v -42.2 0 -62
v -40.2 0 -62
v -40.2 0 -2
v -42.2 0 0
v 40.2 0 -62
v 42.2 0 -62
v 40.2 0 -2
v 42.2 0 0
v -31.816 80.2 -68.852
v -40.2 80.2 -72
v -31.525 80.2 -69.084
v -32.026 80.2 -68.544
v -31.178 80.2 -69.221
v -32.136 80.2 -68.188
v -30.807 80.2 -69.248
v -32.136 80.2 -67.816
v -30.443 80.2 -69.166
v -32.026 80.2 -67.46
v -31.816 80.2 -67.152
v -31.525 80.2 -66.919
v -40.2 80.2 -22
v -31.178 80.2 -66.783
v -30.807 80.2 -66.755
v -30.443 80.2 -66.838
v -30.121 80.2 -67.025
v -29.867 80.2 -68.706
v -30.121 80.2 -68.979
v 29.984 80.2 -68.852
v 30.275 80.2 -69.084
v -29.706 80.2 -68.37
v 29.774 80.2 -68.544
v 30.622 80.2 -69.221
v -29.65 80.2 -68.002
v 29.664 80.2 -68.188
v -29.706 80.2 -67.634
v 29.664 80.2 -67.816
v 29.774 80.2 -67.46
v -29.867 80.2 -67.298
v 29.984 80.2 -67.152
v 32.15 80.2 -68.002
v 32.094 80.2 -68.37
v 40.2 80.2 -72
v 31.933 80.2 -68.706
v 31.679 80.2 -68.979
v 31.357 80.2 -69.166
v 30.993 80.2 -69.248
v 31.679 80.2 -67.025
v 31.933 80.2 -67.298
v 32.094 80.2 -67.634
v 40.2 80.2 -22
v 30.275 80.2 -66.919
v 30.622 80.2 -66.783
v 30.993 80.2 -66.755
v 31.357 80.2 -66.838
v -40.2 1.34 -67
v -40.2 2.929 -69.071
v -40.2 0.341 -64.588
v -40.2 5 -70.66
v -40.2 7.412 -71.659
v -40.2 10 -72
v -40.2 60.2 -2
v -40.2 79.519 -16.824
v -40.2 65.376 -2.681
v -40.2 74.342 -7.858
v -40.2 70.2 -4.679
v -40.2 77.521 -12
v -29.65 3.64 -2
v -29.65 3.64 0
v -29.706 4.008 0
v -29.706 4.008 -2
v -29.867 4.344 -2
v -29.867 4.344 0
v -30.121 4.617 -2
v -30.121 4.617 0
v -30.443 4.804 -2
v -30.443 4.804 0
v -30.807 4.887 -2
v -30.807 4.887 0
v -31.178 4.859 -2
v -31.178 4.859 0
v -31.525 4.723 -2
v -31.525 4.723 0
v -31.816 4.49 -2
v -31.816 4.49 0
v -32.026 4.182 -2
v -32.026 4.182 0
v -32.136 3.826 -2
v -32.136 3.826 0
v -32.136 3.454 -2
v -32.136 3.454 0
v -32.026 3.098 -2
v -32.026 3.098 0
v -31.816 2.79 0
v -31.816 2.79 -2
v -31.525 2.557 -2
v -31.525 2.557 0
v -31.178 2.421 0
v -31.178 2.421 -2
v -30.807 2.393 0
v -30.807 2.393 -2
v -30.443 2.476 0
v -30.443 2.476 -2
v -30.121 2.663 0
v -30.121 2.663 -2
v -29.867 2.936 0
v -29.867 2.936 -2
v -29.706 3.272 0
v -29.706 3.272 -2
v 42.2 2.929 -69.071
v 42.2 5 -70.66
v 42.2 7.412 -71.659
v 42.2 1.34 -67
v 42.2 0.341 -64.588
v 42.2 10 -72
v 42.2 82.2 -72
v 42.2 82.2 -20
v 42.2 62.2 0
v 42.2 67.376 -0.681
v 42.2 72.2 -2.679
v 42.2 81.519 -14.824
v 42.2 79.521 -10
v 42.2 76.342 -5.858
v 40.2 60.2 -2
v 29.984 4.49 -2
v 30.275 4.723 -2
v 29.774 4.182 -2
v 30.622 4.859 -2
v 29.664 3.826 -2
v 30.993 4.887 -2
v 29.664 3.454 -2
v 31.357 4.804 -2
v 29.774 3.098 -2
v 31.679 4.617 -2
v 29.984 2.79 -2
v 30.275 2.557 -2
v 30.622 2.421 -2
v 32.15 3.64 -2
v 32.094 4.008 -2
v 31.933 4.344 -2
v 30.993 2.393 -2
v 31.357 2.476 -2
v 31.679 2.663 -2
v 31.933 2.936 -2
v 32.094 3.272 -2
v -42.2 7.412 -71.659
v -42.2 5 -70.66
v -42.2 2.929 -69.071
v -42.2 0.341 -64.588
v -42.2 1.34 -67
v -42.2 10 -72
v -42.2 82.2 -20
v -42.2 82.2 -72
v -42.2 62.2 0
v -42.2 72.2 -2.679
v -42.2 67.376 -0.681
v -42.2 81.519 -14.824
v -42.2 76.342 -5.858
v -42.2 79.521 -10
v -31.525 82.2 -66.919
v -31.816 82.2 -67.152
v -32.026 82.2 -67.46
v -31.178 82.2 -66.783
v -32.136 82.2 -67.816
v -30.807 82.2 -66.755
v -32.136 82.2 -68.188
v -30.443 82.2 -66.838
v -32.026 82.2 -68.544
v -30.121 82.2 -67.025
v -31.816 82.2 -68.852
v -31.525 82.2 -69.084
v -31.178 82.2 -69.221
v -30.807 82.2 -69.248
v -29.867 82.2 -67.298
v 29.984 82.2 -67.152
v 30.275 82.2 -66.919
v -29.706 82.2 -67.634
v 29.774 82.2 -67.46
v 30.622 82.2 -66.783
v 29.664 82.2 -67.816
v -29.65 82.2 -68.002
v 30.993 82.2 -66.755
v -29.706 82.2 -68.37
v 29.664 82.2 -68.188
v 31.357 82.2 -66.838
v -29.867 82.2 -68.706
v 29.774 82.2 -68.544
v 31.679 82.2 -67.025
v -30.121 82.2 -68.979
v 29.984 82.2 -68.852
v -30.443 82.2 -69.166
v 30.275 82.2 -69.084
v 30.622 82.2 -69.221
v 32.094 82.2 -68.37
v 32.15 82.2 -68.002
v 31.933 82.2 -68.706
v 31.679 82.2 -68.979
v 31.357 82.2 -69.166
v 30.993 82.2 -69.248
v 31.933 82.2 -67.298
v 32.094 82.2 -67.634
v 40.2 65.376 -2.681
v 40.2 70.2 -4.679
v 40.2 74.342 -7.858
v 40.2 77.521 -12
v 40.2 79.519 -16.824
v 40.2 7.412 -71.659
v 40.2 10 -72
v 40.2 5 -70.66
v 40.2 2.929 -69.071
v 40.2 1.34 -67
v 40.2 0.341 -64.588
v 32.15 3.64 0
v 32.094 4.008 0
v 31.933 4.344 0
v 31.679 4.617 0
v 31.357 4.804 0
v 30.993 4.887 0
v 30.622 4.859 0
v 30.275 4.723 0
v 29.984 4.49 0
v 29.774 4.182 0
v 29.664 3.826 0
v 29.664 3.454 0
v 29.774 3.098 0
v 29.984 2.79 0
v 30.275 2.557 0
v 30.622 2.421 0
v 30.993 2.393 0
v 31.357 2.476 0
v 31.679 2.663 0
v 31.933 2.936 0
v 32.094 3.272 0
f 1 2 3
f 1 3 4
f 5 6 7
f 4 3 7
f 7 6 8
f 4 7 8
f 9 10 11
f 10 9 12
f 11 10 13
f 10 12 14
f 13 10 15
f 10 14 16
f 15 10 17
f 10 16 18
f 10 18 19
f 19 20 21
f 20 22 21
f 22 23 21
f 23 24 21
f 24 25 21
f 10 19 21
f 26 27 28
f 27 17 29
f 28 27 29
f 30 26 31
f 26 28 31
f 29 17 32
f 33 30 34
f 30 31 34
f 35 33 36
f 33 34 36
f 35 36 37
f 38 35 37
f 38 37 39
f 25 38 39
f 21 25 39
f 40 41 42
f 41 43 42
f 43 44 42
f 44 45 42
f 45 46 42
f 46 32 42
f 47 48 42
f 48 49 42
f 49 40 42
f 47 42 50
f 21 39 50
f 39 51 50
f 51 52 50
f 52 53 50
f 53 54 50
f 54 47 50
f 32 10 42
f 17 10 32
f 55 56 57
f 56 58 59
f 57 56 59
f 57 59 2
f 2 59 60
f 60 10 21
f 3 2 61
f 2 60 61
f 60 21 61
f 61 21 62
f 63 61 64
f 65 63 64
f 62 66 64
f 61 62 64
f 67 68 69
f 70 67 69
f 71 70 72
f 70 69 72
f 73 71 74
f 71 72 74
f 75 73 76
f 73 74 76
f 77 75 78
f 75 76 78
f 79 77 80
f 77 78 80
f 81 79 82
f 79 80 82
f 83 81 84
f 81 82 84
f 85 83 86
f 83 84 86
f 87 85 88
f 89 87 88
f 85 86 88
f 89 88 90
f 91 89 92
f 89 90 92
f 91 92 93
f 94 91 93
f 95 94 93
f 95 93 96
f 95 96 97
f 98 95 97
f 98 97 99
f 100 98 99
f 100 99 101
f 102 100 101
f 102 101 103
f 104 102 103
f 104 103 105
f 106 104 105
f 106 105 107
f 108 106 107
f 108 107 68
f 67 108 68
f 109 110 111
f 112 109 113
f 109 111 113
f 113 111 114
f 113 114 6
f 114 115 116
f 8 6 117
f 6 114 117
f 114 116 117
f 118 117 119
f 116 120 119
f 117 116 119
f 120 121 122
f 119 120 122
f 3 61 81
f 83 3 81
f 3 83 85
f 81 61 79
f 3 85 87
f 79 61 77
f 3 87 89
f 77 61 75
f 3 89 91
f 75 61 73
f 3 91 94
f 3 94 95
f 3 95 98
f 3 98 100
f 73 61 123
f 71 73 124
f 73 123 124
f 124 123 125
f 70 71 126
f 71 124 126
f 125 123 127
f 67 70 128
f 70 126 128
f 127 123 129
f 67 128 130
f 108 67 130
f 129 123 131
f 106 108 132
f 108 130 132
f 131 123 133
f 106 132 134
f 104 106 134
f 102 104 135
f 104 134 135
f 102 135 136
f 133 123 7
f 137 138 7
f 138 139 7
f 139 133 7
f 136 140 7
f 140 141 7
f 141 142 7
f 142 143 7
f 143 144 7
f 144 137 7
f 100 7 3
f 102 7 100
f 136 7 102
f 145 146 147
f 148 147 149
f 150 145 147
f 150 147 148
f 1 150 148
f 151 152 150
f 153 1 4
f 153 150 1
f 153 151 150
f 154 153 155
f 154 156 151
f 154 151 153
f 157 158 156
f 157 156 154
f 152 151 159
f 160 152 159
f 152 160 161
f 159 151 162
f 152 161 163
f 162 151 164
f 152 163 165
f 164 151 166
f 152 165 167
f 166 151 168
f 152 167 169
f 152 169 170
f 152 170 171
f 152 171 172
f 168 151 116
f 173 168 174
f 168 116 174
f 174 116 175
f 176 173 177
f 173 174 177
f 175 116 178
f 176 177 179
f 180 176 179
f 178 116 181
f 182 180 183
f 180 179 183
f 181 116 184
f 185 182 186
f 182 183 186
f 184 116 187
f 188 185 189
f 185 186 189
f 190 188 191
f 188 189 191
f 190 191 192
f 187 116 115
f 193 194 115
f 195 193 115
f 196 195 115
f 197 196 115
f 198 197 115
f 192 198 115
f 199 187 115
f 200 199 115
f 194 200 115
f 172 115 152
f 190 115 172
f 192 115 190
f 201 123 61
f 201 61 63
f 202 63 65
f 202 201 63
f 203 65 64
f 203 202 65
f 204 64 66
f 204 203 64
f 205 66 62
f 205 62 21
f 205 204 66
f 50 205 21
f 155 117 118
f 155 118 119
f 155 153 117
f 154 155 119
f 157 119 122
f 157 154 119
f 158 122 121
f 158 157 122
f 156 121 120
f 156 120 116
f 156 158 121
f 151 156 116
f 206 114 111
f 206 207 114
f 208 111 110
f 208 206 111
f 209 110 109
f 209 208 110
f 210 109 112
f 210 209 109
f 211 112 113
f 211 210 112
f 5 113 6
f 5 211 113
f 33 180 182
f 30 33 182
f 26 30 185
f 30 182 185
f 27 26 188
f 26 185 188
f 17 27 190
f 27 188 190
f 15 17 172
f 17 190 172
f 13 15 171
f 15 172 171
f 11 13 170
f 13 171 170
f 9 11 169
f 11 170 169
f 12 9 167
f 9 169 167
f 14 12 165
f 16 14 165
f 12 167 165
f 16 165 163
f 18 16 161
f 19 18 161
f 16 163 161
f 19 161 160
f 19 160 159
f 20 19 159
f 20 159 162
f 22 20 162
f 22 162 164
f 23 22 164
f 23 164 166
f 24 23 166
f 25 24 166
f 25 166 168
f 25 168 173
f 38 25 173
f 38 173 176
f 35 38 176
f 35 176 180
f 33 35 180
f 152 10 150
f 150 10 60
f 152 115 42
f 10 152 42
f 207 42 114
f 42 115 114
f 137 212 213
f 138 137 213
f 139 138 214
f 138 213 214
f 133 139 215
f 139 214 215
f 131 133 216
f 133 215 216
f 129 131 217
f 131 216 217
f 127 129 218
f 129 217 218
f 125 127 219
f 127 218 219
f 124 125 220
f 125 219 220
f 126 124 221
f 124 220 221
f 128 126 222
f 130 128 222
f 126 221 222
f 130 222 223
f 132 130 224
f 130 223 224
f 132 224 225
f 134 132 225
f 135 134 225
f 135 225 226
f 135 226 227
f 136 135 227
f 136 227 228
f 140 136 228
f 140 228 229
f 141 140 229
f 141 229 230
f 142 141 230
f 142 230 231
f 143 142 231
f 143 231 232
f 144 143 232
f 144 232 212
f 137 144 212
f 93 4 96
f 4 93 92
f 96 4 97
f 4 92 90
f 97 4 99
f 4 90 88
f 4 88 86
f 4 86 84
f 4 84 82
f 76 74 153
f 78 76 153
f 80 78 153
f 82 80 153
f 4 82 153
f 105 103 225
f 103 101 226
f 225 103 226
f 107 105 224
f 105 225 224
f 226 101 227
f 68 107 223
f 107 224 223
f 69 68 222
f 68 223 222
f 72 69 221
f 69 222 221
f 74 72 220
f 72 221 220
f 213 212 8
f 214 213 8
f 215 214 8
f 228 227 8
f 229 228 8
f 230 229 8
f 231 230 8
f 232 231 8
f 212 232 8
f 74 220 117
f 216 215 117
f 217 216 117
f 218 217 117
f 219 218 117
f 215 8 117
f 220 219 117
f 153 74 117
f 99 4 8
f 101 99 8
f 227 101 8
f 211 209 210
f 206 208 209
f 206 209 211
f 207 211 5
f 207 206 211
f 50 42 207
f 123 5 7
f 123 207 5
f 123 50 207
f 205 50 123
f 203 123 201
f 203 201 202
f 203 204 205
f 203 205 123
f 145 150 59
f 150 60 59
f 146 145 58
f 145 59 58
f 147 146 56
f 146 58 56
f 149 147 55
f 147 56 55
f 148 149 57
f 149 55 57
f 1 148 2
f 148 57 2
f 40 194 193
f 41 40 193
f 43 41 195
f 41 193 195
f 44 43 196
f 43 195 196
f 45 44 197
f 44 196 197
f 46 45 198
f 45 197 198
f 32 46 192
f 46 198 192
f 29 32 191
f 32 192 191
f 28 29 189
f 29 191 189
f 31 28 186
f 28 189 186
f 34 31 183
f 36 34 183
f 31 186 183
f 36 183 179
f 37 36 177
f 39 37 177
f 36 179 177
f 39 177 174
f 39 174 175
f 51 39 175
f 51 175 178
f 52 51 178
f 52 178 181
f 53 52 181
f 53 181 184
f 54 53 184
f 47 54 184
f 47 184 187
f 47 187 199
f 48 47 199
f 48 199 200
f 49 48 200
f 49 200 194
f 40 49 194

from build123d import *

# Parameters (mm, degrees)
BOSS_EXTRUDE1_DEPTH = 42.2
SKETCH2_R           = 1.25
CUT_EXTRUDE1_DEPTH  = 70
FILLET1_R           = 20
BOSS_EXTRUDE2_DEPTH = 2
FILLET2_R           = 10
SKETCH4_R           = 1.25
CUT_EXTRUDE2_DEPTH  = 10


with BuildPart() as part:
    # Sketch1 → Boss-Extrude1 (new body, symmetric)
    with BuildSketch(Plane(origin=(0, 0, 0), x_dir=(0, 0, -1), z_dir=(1, 0, 0))):
        Polygon((0, 0), (0, 82.2), (72, 82.2), (72, 80.2), (2, 80.2), (2, 0), align=None)
    extrude(amount=BOSS_EXTRUDE1_DEPTH, both=True)

    # Sketch2 → Cut-Extrude1 (cut)
    with BuildSketch(Plane.XY):
        with Locations((-30.9, 3.64)):
            Circle(SKETCH2_R)
        with Locations((30.9, 3.64)):
            Circle(SKETCH2_R)
    extrude(amount=-CUT_EXTRUDE1_DEPTH, mode=Mode.SUBTRACT)

    # Fillet1
    fillet1_edges = [part.edges().sort_by_distance(p)[0] for p in [
        (0, 82.2, 0),
        (0, 80.2, -2),
    ]]
    fillet(fillet1_edges, radius=FILLET1_R)

    # Sketch3 → Boss-Extrude2 (add)
    with BuildSketch(Plane.ZY.offset(42.2)):
        with BuildLine():
            Line((-72, 80.2), (-72, 0))
            Line((-72, 0), (-2, 0))
            Line((-2, 0), (-2, 60.2))
            ThreePointArc((-2, 60.2), (-7.857864376, 74.342135624), (-22, 80.2))
            Line((-22, 80.2), (-72, 80.2))
        make_face()
    boss_extrude2 = extrude(amount=-BOSS_EXTRUDE2_DEPTH)

    # Mirror1: Boss-Extrude2 across plane
    add(boss_extrude2.mirror(Plane(origin=(0, 0, 0), x_dir=(0, 0, 1), z_dir=(1, 0, 0))))

    # Fillet2
    fillet2_edges = [part.edges().sort_by_distance(p)[0] for p in [
        (-41.2, 0, -72),
        (41.2, 0, -72),
    ]]
    fillet(fillet2_edges, radius=FILLET2_R)

    # Sketch4 → Cut-Extrude2 (cut)
    with BuildSketch(Plane(origin=(0, 82.2, 0), x_dir=(1, 0, 0), z_dir=(0, 1, 0))):
        with Locations((-30.9, 68.001968)):
            Circle(SKETCH4_R)
        with Locations((30.9, 68.001968)):
            Circle(SKETCH4_R)
    extrude(amount=-CUT_EXTRUDE2_DEPTH, mode=Mode.SUBTRACT)


solid = part.part
